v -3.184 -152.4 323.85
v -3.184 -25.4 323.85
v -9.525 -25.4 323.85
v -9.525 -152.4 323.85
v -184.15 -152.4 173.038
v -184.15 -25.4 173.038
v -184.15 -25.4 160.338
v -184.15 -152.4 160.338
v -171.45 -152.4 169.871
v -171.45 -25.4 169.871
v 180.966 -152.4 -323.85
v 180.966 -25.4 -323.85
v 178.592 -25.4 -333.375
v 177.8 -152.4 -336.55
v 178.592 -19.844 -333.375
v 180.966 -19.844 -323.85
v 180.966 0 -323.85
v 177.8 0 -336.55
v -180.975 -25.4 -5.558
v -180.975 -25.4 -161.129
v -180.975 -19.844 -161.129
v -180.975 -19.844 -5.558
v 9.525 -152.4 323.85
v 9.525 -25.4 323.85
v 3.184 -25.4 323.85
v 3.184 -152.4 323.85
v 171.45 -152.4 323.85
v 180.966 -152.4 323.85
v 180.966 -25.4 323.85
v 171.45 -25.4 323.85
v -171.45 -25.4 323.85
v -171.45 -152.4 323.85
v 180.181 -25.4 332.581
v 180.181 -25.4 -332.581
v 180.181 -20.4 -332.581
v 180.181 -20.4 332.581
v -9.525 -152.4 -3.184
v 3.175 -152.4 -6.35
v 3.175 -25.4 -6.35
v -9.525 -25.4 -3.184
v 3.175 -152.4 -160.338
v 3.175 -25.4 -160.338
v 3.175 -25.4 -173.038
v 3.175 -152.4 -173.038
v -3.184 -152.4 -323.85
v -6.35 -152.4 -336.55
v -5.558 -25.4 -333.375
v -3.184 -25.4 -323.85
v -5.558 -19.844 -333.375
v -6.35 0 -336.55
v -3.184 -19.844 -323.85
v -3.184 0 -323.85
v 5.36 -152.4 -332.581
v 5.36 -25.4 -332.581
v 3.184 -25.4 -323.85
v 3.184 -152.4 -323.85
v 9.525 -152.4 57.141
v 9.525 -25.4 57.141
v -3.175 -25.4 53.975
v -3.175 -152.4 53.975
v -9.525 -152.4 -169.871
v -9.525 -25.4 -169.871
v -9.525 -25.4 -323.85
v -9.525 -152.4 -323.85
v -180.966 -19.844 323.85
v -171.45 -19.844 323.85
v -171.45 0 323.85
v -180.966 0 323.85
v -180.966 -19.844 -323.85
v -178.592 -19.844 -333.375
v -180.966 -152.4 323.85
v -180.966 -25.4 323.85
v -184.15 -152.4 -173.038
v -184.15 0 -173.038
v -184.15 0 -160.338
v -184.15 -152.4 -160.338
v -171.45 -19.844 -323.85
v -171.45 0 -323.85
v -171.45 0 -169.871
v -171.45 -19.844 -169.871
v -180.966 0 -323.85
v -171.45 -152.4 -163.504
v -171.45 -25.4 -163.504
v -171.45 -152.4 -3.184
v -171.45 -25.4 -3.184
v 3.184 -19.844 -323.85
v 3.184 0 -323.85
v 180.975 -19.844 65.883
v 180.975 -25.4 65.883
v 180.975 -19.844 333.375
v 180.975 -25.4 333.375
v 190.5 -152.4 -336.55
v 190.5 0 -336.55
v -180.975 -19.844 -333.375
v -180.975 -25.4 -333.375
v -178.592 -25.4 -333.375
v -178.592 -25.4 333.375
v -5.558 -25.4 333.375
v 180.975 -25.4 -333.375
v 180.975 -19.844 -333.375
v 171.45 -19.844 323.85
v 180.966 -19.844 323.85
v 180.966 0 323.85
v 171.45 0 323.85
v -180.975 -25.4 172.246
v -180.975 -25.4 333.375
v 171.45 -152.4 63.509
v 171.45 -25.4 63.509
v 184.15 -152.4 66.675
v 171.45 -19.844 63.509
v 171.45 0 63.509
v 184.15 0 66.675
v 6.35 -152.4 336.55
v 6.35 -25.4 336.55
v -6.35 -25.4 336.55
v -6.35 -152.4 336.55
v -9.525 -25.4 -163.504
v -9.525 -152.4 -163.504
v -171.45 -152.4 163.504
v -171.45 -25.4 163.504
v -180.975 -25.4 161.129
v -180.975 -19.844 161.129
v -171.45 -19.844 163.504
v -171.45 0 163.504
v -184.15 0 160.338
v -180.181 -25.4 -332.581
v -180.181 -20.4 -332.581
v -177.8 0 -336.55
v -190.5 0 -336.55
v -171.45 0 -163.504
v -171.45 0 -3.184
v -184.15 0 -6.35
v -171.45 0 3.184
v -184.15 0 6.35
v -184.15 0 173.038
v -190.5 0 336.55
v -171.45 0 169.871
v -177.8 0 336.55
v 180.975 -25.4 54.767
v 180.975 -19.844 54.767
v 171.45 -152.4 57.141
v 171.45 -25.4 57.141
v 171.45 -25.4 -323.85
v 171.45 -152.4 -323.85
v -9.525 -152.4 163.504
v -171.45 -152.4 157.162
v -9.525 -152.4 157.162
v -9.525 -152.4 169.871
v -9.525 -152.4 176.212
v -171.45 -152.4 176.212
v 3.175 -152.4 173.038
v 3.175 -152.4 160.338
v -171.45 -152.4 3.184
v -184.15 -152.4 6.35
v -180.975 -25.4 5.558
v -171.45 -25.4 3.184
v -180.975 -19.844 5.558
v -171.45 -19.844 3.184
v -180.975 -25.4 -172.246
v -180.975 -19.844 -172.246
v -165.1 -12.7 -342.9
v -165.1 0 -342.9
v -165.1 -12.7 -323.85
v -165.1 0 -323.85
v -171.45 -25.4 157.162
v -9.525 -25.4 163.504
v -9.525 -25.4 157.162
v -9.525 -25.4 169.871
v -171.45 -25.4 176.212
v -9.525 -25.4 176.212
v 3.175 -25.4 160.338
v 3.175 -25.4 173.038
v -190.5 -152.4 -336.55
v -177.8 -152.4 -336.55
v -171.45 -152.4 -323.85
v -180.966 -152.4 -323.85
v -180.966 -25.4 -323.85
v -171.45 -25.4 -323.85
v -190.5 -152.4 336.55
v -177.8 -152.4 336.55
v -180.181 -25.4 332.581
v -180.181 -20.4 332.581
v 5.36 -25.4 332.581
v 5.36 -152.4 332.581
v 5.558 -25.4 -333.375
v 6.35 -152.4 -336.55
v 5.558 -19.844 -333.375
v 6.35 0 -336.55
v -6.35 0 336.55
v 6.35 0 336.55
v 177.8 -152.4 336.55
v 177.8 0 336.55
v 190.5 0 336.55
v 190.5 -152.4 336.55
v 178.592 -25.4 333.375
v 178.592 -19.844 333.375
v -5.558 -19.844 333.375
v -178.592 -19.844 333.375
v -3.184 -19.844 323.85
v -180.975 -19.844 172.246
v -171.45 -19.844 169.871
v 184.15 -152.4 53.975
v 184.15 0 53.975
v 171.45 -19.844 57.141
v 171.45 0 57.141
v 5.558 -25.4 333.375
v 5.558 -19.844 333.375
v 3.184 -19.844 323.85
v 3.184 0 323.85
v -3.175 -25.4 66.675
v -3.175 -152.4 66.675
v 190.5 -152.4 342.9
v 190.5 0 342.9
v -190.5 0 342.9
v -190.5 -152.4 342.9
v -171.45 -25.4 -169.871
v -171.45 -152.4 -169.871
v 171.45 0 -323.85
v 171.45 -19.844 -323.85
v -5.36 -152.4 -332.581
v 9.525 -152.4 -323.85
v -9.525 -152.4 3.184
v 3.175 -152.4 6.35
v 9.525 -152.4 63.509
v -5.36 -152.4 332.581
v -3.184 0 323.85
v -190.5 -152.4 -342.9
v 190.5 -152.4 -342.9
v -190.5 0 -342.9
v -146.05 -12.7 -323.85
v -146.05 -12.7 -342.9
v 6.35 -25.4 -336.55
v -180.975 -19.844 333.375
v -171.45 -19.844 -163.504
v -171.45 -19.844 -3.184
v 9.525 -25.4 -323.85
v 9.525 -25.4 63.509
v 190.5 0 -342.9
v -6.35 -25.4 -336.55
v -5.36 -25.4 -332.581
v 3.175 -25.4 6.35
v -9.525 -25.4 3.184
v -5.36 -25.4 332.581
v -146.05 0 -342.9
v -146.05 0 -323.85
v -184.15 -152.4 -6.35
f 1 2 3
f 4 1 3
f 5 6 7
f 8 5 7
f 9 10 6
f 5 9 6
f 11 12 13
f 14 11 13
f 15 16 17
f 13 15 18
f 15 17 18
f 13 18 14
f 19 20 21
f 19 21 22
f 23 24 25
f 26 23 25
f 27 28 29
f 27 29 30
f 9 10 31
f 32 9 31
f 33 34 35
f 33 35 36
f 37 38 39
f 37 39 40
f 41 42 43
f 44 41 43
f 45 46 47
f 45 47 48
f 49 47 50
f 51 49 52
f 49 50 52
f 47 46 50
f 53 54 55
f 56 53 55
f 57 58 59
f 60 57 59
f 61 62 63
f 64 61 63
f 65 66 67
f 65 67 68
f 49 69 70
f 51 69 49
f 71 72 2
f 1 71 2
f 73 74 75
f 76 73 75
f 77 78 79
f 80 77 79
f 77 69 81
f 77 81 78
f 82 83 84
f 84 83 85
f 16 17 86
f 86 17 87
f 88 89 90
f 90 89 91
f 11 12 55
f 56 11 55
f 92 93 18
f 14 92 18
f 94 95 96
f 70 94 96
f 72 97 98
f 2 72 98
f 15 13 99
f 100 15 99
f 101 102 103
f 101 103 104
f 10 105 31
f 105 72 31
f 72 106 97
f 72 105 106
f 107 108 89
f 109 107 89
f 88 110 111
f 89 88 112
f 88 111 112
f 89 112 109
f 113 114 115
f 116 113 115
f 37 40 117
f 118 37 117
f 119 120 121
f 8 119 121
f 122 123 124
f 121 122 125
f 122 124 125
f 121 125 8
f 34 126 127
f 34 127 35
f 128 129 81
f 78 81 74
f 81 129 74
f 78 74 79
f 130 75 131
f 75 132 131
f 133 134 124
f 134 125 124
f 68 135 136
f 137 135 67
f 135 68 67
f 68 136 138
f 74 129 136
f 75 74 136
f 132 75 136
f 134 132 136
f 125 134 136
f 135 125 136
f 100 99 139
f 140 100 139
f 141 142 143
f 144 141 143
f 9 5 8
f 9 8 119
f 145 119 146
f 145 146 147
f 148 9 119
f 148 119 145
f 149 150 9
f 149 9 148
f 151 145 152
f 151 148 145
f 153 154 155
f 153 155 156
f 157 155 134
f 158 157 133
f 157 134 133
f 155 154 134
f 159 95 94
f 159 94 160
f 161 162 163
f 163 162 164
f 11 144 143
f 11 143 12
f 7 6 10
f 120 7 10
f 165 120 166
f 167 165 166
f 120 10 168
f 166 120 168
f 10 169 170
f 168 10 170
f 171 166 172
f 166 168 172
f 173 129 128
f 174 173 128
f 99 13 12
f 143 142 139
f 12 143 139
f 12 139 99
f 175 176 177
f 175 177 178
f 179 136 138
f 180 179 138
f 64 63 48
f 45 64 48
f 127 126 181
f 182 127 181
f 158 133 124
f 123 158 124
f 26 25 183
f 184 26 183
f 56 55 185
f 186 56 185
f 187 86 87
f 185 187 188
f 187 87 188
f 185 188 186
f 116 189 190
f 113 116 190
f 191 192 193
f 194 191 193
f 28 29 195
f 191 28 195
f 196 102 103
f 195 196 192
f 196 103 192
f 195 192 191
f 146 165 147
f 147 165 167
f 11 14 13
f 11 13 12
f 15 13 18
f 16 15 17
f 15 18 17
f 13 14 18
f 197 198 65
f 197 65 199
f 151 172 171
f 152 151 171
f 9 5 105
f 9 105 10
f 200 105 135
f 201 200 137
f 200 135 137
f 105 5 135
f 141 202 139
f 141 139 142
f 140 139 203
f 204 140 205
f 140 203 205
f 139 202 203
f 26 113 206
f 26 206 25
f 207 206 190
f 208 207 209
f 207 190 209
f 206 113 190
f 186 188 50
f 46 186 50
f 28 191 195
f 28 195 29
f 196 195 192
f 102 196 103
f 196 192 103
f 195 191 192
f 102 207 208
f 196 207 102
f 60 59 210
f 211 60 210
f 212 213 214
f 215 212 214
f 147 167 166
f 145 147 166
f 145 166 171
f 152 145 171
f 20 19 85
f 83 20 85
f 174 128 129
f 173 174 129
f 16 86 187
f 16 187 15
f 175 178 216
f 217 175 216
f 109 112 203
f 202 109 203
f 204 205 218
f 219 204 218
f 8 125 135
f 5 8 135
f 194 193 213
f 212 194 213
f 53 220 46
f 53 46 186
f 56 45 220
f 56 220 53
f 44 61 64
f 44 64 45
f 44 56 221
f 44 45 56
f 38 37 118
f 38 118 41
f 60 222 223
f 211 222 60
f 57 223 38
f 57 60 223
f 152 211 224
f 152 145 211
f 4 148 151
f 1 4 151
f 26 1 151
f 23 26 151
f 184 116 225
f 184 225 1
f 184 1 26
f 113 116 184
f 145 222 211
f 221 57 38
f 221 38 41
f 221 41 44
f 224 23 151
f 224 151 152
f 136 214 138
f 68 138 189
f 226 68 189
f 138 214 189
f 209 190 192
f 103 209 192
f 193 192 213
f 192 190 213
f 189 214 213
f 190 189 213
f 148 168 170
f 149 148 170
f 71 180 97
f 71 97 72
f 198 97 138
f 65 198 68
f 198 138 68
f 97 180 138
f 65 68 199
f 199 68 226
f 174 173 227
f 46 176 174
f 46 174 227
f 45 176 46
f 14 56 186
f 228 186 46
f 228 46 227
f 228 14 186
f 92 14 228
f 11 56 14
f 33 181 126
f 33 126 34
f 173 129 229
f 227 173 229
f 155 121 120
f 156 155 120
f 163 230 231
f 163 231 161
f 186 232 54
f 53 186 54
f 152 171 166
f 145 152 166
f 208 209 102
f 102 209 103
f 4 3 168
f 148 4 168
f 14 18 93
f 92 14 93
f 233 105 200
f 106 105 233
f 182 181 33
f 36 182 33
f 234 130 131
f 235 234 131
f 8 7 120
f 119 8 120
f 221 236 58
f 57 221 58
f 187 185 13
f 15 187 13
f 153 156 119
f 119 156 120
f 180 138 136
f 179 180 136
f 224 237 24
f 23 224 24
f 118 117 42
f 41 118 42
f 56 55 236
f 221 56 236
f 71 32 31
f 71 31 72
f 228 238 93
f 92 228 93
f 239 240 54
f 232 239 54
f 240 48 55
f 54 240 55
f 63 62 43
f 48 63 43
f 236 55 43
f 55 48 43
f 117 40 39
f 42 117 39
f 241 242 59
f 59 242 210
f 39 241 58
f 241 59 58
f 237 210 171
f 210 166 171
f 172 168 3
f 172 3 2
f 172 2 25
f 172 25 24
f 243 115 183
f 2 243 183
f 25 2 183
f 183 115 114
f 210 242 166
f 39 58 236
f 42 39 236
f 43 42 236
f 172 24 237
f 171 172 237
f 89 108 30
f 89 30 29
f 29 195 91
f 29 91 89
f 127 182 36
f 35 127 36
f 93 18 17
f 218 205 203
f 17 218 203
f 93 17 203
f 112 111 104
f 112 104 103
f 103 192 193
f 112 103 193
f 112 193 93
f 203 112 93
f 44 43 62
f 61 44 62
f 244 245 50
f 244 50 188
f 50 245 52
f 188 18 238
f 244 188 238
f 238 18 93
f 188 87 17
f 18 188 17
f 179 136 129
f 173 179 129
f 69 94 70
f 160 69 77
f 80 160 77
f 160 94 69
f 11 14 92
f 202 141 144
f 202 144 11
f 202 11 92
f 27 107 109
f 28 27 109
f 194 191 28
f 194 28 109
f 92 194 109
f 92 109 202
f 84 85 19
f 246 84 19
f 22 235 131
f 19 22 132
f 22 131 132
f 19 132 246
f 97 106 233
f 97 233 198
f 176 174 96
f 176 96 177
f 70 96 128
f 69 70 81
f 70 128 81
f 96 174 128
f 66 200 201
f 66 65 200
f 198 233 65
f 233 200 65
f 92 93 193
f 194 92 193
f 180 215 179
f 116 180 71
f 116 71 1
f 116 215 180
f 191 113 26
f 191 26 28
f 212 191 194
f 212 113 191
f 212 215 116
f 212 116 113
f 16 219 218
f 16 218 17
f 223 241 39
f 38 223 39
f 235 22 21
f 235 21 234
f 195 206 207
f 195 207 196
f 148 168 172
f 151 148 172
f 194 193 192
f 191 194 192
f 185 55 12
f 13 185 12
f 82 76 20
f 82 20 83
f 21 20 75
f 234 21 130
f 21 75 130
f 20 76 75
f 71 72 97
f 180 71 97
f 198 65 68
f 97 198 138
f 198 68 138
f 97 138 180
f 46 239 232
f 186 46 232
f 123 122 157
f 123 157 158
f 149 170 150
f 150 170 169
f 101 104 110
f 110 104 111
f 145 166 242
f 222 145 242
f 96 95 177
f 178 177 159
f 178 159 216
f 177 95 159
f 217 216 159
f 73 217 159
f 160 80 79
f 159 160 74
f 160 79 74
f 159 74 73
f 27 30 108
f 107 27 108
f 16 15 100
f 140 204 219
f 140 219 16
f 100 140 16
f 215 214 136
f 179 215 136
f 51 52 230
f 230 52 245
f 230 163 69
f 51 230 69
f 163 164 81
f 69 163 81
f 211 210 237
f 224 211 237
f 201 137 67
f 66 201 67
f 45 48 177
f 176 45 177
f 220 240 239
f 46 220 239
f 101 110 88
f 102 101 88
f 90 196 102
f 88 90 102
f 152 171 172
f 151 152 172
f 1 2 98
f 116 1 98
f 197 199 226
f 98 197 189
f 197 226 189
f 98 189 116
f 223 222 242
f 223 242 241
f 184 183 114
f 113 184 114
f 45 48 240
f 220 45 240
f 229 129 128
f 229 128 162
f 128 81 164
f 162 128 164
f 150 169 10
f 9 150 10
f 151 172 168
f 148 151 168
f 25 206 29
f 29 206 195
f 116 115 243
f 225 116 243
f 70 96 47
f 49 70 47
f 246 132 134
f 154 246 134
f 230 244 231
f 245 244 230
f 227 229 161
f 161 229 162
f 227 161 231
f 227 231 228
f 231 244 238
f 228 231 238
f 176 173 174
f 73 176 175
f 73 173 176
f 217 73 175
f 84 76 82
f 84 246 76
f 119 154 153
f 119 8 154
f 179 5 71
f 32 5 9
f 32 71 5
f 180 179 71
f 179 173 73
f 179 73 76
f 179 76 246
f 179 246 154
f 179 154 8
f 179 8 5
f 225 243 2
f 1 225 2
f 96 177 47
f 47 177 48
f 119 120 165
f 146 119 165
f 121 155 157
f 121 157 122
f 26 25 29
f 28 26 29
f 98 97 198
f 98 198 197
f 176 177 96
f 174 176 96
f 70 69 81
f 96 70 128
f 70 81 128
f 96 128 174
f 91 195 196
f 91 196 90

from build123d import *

# Parameters (mm, degrees)
F1_DEPTH  = 152.4
F2_DEPTH  = 152.4
F3_W      = 19.05
F3_H      = 19.05
F4_DEPTH  = 12.7
F6_W      = 361.95
F6_H      = 666.75
F7_DEPTH  = 5.55625
F8_W      = 360.3625
F8_H      = 665.1625
F9_DEPTH  = 4.99999
F11_DEPTH = 127
F13_DEPTH = 127


# Not quite as in the source:
# - a feature names something its author has since deleted; it is built from what else it names


with BuildPart() as f1:
    # F0 (on Front) → F1 (new body)
    with BuildSketch(Plane.XZ):
        Polygon((-180.9664656361, 323.85), (-190.5, 323.85), (-190.5, -323.85), (-180.9664656361, -323.85), (-171.45, -323.85), (-171.45, -176.2125), (-171.45, -169.8710343639), (-184.15, -173.0375), (-184.15, -160.3375), (-171.45, -163.5039656361), (-171.45, -157.1625), (-171.45, -9.525), (-171.45, -3.1835343639), (-184.15, -6.35), (-184.15, 6.35), (-171.45, 3.1835343639), (-171.45, 9.525), (-171.45, 157.1625), (-171.45, 163.5039656361), (-184.15, 160.3375), (-184.15, 173.0375), (-171.45, 169.8710343639), (-171.45, 176.2125), (-171.45, 323.85), align=None)
        Polygon((-177.8, 336.55), (-190.5, 336.55), (-190.5, 323.85), (-180.9664656361, 323.85), align=None)
        Polygon((-180.9664656361, -323.85), (-190.5, -323.85), (-190.5, -336.55), (-177.8, -336.55), align=None)
    extrude(amount=F1_DEPTH)


with BuildPart() as f1b:
    # F0 (on Front) → F1, piece 2 (new body)
    with BuildSketch(Plane.XZ):
        Polygon((190.5, -323.85), (190.5, 323.85), (180.9664656361, 323.85), (171.45, 323.85), (171.45, 69.85), (171.45, 63.5085343639), (184.15, 66.675), (184.15, 53.975), (171.45, 57.1414656361), (171.45, 50.8), (171.45, -323.85), (180.9664656361, -323.85), align=None)
        Polygon((190.5, -336.55), (190.5, -323.85), (180.9664656361, -323.85), (177.8, -336.55), align=None)
        Polygon((190.5, 323.85), (190.5, 336.55), (177.8, 336.55), (180.9664656361, 323.85), align=None)
    extrude(amount=F1_DEPTH)


with BuildPart() as f2:
    # F0 (on Front) → F2 (new body, through all)
    with BuildSketch(Plane.XZ):
        Polygon((190.5, 336.55), (190.5, 342.9), (-190.5, 342.9), (-190.5, 336.55), (-177.8, 336.55), (-180.9664656361, 323.85), (-171.45, 323.85), (-9.525, 323.85), (-3.1835343639, 323.85), (-6.35, 336.55), (6.35, 336.55), (3.1835343639, 323.85), (9.525, 323.85), (171.45, 323.85), (180.9664656361, 323.85), (177.8, 336.55), align=None)
    extrude(amount=F2_DEPTH)


with BuildPart() as f2b:
    # F0 (on Front) → F2, piece 2 (new body, through all)
    with BuildSketch(Plane.XZ):
        Polygon((190.5, -342.9), (190.5, -336.55), (177.8, -336.55), (180.9664656361, -323.85), (171.45, -323.85), (9.525, -323.85), (9.525, -342.9), align=None)
        Polygon((-9.525, -342.9), (9.525, -342.9), (9.525, -323.85), (3.1835343639, -323.85), (6.35, -336.55), (-6.35, -336.55), (-3.1835343639, -323.85), (-9.525, -323.85), align=None)
        Polygon((-177.8, -336.55), (-190.5, -336.55), (-190.5, -342.9), (-9.525, -342.9), (-9.525, -323.85), (-171.45, -323.85), (-180.9664656361, -323.85), align=None)
    extrude(amount=F2_DEPTH)

    # F3 (on face) → F4 (cut)
    with BuildSketch(Plane(origin=(0, 0, 0), x_dir=(-1, 0, 0), z_dir=(0, 1, 0))):
        with Locations((155.575, -333.375)):
            Rectangle(F3_W, F3_H)
    extrude(amount=-F4_DEPTH, mode=Mode.SUBTRACT)


with BuildPart() as f7_tool:
    # F6 (on offset) → F7 (new body)
    with BuildSketch(Plane.XZ.offset(25.4)):
        Rectangle(F6_W, F6_H)
    extrude(amount=-F7_DEPTH)


with BuildPart() as f1_1:
    add(f1.part)

    # F7: cut by f7_tool
    add(f7_tool.part, mode=Mode.SUBTRACT)


with BuildPart() as f1b_1:
    add(f1b.part)

    # F7: cut by f7_tool
    add(f7_tool.part, mode=Mode.SUBTRACT)


with BuildPart() as f2_1:
    add(f2.part)

    # F7: cut by f7_tool
    add(f7_tool.part, mode=Mode.SUBTRACT)


with BuildPart() as f2b_1:
    add(f2b.part)

    # F7: cut by f7_tool
    add(f7_tool.part, mode=Mode.SUBTRACT)


with BuildPart() as f9:
    # F8 (on offset) → F9 (new body)
    with BuildSketch(Plane.XZ.offset(25.4)):
        Rectangle(F8_W, F8_H)
    extrude(amount=-F9_DEPTH)


with BuildPart() as f11:
    # F10 (on face) → F11 (new body, through all)
    with BuildSketch(Plane.XZ.offset(25.4)):
        Polygon((-5.3604794887, 332.58125), (5.3604794887, 332.58125), (6.35, 336.55), (-6.35, 336.55), align=None)
        Polygon((6.35, -336.55), (5.3604794887, -332.58125), (-5.3604794887, -332.58125), (-6.35, -336.55), align=None)
        Polygon((9.525, 63.5085343639), (9.525, 323.85), (3.1835343639, 323.85), (5.3604794887, 332.58125), (-5.3604794887, 332.58125), (-3.1835343639, 323.85), (-9.525, 323.85), (-9.525, 169.8710343639), (3.175, 173.0375), (3.175, 160.3375), (-9.525, 163.5039656361), (-9.525, 3.1835343639), (3.175, 6.35), (3.175, -6.35), (-9.525, -3.1835343639), (-9.525, -163.5039656361), (3.175, -160.3375), (3.175, -173.0375), (-9.525, -169.8710343639), (-9.525, -323.85), (-3.1835343639, -323.85), (-5.3604794887, -332.58125), (5.3604794887, -332.58125), (3.1835343639, -323.85), (9.525, -323.85), (9.525, 57.1414656361), (-3.175, 53.975), (-3.175, 66.675), align=None)
    extrude(amount=F11_DEPTH)


with BuildPart() as f13:
    # F12 (on face) → F13 (new body, through all)
    with BuildSketch(Plane.XZ.offset(25.4)):
        Polygon((-9.525, 169.8710343639), (-9.525, 176.2125), (-171.45, 176.2125), (-171.45, 169.8710343639), (-184.15, 173.0375), (-184.15, 160.3375), (-171.45, 163.5039656361), (-171.45, 157.1625), (-9.525, 157.1625), (-9.525, 163.5039656361), (3.175, 160.3375), (3.175, 173.0375), align=None)
    extrude(amount=F13_DEPTH)


solid = Compound([f1_1.part, f1b_1.part, f2_1.part, f2b_1.part, f9.part, f11.part, f13.part])
